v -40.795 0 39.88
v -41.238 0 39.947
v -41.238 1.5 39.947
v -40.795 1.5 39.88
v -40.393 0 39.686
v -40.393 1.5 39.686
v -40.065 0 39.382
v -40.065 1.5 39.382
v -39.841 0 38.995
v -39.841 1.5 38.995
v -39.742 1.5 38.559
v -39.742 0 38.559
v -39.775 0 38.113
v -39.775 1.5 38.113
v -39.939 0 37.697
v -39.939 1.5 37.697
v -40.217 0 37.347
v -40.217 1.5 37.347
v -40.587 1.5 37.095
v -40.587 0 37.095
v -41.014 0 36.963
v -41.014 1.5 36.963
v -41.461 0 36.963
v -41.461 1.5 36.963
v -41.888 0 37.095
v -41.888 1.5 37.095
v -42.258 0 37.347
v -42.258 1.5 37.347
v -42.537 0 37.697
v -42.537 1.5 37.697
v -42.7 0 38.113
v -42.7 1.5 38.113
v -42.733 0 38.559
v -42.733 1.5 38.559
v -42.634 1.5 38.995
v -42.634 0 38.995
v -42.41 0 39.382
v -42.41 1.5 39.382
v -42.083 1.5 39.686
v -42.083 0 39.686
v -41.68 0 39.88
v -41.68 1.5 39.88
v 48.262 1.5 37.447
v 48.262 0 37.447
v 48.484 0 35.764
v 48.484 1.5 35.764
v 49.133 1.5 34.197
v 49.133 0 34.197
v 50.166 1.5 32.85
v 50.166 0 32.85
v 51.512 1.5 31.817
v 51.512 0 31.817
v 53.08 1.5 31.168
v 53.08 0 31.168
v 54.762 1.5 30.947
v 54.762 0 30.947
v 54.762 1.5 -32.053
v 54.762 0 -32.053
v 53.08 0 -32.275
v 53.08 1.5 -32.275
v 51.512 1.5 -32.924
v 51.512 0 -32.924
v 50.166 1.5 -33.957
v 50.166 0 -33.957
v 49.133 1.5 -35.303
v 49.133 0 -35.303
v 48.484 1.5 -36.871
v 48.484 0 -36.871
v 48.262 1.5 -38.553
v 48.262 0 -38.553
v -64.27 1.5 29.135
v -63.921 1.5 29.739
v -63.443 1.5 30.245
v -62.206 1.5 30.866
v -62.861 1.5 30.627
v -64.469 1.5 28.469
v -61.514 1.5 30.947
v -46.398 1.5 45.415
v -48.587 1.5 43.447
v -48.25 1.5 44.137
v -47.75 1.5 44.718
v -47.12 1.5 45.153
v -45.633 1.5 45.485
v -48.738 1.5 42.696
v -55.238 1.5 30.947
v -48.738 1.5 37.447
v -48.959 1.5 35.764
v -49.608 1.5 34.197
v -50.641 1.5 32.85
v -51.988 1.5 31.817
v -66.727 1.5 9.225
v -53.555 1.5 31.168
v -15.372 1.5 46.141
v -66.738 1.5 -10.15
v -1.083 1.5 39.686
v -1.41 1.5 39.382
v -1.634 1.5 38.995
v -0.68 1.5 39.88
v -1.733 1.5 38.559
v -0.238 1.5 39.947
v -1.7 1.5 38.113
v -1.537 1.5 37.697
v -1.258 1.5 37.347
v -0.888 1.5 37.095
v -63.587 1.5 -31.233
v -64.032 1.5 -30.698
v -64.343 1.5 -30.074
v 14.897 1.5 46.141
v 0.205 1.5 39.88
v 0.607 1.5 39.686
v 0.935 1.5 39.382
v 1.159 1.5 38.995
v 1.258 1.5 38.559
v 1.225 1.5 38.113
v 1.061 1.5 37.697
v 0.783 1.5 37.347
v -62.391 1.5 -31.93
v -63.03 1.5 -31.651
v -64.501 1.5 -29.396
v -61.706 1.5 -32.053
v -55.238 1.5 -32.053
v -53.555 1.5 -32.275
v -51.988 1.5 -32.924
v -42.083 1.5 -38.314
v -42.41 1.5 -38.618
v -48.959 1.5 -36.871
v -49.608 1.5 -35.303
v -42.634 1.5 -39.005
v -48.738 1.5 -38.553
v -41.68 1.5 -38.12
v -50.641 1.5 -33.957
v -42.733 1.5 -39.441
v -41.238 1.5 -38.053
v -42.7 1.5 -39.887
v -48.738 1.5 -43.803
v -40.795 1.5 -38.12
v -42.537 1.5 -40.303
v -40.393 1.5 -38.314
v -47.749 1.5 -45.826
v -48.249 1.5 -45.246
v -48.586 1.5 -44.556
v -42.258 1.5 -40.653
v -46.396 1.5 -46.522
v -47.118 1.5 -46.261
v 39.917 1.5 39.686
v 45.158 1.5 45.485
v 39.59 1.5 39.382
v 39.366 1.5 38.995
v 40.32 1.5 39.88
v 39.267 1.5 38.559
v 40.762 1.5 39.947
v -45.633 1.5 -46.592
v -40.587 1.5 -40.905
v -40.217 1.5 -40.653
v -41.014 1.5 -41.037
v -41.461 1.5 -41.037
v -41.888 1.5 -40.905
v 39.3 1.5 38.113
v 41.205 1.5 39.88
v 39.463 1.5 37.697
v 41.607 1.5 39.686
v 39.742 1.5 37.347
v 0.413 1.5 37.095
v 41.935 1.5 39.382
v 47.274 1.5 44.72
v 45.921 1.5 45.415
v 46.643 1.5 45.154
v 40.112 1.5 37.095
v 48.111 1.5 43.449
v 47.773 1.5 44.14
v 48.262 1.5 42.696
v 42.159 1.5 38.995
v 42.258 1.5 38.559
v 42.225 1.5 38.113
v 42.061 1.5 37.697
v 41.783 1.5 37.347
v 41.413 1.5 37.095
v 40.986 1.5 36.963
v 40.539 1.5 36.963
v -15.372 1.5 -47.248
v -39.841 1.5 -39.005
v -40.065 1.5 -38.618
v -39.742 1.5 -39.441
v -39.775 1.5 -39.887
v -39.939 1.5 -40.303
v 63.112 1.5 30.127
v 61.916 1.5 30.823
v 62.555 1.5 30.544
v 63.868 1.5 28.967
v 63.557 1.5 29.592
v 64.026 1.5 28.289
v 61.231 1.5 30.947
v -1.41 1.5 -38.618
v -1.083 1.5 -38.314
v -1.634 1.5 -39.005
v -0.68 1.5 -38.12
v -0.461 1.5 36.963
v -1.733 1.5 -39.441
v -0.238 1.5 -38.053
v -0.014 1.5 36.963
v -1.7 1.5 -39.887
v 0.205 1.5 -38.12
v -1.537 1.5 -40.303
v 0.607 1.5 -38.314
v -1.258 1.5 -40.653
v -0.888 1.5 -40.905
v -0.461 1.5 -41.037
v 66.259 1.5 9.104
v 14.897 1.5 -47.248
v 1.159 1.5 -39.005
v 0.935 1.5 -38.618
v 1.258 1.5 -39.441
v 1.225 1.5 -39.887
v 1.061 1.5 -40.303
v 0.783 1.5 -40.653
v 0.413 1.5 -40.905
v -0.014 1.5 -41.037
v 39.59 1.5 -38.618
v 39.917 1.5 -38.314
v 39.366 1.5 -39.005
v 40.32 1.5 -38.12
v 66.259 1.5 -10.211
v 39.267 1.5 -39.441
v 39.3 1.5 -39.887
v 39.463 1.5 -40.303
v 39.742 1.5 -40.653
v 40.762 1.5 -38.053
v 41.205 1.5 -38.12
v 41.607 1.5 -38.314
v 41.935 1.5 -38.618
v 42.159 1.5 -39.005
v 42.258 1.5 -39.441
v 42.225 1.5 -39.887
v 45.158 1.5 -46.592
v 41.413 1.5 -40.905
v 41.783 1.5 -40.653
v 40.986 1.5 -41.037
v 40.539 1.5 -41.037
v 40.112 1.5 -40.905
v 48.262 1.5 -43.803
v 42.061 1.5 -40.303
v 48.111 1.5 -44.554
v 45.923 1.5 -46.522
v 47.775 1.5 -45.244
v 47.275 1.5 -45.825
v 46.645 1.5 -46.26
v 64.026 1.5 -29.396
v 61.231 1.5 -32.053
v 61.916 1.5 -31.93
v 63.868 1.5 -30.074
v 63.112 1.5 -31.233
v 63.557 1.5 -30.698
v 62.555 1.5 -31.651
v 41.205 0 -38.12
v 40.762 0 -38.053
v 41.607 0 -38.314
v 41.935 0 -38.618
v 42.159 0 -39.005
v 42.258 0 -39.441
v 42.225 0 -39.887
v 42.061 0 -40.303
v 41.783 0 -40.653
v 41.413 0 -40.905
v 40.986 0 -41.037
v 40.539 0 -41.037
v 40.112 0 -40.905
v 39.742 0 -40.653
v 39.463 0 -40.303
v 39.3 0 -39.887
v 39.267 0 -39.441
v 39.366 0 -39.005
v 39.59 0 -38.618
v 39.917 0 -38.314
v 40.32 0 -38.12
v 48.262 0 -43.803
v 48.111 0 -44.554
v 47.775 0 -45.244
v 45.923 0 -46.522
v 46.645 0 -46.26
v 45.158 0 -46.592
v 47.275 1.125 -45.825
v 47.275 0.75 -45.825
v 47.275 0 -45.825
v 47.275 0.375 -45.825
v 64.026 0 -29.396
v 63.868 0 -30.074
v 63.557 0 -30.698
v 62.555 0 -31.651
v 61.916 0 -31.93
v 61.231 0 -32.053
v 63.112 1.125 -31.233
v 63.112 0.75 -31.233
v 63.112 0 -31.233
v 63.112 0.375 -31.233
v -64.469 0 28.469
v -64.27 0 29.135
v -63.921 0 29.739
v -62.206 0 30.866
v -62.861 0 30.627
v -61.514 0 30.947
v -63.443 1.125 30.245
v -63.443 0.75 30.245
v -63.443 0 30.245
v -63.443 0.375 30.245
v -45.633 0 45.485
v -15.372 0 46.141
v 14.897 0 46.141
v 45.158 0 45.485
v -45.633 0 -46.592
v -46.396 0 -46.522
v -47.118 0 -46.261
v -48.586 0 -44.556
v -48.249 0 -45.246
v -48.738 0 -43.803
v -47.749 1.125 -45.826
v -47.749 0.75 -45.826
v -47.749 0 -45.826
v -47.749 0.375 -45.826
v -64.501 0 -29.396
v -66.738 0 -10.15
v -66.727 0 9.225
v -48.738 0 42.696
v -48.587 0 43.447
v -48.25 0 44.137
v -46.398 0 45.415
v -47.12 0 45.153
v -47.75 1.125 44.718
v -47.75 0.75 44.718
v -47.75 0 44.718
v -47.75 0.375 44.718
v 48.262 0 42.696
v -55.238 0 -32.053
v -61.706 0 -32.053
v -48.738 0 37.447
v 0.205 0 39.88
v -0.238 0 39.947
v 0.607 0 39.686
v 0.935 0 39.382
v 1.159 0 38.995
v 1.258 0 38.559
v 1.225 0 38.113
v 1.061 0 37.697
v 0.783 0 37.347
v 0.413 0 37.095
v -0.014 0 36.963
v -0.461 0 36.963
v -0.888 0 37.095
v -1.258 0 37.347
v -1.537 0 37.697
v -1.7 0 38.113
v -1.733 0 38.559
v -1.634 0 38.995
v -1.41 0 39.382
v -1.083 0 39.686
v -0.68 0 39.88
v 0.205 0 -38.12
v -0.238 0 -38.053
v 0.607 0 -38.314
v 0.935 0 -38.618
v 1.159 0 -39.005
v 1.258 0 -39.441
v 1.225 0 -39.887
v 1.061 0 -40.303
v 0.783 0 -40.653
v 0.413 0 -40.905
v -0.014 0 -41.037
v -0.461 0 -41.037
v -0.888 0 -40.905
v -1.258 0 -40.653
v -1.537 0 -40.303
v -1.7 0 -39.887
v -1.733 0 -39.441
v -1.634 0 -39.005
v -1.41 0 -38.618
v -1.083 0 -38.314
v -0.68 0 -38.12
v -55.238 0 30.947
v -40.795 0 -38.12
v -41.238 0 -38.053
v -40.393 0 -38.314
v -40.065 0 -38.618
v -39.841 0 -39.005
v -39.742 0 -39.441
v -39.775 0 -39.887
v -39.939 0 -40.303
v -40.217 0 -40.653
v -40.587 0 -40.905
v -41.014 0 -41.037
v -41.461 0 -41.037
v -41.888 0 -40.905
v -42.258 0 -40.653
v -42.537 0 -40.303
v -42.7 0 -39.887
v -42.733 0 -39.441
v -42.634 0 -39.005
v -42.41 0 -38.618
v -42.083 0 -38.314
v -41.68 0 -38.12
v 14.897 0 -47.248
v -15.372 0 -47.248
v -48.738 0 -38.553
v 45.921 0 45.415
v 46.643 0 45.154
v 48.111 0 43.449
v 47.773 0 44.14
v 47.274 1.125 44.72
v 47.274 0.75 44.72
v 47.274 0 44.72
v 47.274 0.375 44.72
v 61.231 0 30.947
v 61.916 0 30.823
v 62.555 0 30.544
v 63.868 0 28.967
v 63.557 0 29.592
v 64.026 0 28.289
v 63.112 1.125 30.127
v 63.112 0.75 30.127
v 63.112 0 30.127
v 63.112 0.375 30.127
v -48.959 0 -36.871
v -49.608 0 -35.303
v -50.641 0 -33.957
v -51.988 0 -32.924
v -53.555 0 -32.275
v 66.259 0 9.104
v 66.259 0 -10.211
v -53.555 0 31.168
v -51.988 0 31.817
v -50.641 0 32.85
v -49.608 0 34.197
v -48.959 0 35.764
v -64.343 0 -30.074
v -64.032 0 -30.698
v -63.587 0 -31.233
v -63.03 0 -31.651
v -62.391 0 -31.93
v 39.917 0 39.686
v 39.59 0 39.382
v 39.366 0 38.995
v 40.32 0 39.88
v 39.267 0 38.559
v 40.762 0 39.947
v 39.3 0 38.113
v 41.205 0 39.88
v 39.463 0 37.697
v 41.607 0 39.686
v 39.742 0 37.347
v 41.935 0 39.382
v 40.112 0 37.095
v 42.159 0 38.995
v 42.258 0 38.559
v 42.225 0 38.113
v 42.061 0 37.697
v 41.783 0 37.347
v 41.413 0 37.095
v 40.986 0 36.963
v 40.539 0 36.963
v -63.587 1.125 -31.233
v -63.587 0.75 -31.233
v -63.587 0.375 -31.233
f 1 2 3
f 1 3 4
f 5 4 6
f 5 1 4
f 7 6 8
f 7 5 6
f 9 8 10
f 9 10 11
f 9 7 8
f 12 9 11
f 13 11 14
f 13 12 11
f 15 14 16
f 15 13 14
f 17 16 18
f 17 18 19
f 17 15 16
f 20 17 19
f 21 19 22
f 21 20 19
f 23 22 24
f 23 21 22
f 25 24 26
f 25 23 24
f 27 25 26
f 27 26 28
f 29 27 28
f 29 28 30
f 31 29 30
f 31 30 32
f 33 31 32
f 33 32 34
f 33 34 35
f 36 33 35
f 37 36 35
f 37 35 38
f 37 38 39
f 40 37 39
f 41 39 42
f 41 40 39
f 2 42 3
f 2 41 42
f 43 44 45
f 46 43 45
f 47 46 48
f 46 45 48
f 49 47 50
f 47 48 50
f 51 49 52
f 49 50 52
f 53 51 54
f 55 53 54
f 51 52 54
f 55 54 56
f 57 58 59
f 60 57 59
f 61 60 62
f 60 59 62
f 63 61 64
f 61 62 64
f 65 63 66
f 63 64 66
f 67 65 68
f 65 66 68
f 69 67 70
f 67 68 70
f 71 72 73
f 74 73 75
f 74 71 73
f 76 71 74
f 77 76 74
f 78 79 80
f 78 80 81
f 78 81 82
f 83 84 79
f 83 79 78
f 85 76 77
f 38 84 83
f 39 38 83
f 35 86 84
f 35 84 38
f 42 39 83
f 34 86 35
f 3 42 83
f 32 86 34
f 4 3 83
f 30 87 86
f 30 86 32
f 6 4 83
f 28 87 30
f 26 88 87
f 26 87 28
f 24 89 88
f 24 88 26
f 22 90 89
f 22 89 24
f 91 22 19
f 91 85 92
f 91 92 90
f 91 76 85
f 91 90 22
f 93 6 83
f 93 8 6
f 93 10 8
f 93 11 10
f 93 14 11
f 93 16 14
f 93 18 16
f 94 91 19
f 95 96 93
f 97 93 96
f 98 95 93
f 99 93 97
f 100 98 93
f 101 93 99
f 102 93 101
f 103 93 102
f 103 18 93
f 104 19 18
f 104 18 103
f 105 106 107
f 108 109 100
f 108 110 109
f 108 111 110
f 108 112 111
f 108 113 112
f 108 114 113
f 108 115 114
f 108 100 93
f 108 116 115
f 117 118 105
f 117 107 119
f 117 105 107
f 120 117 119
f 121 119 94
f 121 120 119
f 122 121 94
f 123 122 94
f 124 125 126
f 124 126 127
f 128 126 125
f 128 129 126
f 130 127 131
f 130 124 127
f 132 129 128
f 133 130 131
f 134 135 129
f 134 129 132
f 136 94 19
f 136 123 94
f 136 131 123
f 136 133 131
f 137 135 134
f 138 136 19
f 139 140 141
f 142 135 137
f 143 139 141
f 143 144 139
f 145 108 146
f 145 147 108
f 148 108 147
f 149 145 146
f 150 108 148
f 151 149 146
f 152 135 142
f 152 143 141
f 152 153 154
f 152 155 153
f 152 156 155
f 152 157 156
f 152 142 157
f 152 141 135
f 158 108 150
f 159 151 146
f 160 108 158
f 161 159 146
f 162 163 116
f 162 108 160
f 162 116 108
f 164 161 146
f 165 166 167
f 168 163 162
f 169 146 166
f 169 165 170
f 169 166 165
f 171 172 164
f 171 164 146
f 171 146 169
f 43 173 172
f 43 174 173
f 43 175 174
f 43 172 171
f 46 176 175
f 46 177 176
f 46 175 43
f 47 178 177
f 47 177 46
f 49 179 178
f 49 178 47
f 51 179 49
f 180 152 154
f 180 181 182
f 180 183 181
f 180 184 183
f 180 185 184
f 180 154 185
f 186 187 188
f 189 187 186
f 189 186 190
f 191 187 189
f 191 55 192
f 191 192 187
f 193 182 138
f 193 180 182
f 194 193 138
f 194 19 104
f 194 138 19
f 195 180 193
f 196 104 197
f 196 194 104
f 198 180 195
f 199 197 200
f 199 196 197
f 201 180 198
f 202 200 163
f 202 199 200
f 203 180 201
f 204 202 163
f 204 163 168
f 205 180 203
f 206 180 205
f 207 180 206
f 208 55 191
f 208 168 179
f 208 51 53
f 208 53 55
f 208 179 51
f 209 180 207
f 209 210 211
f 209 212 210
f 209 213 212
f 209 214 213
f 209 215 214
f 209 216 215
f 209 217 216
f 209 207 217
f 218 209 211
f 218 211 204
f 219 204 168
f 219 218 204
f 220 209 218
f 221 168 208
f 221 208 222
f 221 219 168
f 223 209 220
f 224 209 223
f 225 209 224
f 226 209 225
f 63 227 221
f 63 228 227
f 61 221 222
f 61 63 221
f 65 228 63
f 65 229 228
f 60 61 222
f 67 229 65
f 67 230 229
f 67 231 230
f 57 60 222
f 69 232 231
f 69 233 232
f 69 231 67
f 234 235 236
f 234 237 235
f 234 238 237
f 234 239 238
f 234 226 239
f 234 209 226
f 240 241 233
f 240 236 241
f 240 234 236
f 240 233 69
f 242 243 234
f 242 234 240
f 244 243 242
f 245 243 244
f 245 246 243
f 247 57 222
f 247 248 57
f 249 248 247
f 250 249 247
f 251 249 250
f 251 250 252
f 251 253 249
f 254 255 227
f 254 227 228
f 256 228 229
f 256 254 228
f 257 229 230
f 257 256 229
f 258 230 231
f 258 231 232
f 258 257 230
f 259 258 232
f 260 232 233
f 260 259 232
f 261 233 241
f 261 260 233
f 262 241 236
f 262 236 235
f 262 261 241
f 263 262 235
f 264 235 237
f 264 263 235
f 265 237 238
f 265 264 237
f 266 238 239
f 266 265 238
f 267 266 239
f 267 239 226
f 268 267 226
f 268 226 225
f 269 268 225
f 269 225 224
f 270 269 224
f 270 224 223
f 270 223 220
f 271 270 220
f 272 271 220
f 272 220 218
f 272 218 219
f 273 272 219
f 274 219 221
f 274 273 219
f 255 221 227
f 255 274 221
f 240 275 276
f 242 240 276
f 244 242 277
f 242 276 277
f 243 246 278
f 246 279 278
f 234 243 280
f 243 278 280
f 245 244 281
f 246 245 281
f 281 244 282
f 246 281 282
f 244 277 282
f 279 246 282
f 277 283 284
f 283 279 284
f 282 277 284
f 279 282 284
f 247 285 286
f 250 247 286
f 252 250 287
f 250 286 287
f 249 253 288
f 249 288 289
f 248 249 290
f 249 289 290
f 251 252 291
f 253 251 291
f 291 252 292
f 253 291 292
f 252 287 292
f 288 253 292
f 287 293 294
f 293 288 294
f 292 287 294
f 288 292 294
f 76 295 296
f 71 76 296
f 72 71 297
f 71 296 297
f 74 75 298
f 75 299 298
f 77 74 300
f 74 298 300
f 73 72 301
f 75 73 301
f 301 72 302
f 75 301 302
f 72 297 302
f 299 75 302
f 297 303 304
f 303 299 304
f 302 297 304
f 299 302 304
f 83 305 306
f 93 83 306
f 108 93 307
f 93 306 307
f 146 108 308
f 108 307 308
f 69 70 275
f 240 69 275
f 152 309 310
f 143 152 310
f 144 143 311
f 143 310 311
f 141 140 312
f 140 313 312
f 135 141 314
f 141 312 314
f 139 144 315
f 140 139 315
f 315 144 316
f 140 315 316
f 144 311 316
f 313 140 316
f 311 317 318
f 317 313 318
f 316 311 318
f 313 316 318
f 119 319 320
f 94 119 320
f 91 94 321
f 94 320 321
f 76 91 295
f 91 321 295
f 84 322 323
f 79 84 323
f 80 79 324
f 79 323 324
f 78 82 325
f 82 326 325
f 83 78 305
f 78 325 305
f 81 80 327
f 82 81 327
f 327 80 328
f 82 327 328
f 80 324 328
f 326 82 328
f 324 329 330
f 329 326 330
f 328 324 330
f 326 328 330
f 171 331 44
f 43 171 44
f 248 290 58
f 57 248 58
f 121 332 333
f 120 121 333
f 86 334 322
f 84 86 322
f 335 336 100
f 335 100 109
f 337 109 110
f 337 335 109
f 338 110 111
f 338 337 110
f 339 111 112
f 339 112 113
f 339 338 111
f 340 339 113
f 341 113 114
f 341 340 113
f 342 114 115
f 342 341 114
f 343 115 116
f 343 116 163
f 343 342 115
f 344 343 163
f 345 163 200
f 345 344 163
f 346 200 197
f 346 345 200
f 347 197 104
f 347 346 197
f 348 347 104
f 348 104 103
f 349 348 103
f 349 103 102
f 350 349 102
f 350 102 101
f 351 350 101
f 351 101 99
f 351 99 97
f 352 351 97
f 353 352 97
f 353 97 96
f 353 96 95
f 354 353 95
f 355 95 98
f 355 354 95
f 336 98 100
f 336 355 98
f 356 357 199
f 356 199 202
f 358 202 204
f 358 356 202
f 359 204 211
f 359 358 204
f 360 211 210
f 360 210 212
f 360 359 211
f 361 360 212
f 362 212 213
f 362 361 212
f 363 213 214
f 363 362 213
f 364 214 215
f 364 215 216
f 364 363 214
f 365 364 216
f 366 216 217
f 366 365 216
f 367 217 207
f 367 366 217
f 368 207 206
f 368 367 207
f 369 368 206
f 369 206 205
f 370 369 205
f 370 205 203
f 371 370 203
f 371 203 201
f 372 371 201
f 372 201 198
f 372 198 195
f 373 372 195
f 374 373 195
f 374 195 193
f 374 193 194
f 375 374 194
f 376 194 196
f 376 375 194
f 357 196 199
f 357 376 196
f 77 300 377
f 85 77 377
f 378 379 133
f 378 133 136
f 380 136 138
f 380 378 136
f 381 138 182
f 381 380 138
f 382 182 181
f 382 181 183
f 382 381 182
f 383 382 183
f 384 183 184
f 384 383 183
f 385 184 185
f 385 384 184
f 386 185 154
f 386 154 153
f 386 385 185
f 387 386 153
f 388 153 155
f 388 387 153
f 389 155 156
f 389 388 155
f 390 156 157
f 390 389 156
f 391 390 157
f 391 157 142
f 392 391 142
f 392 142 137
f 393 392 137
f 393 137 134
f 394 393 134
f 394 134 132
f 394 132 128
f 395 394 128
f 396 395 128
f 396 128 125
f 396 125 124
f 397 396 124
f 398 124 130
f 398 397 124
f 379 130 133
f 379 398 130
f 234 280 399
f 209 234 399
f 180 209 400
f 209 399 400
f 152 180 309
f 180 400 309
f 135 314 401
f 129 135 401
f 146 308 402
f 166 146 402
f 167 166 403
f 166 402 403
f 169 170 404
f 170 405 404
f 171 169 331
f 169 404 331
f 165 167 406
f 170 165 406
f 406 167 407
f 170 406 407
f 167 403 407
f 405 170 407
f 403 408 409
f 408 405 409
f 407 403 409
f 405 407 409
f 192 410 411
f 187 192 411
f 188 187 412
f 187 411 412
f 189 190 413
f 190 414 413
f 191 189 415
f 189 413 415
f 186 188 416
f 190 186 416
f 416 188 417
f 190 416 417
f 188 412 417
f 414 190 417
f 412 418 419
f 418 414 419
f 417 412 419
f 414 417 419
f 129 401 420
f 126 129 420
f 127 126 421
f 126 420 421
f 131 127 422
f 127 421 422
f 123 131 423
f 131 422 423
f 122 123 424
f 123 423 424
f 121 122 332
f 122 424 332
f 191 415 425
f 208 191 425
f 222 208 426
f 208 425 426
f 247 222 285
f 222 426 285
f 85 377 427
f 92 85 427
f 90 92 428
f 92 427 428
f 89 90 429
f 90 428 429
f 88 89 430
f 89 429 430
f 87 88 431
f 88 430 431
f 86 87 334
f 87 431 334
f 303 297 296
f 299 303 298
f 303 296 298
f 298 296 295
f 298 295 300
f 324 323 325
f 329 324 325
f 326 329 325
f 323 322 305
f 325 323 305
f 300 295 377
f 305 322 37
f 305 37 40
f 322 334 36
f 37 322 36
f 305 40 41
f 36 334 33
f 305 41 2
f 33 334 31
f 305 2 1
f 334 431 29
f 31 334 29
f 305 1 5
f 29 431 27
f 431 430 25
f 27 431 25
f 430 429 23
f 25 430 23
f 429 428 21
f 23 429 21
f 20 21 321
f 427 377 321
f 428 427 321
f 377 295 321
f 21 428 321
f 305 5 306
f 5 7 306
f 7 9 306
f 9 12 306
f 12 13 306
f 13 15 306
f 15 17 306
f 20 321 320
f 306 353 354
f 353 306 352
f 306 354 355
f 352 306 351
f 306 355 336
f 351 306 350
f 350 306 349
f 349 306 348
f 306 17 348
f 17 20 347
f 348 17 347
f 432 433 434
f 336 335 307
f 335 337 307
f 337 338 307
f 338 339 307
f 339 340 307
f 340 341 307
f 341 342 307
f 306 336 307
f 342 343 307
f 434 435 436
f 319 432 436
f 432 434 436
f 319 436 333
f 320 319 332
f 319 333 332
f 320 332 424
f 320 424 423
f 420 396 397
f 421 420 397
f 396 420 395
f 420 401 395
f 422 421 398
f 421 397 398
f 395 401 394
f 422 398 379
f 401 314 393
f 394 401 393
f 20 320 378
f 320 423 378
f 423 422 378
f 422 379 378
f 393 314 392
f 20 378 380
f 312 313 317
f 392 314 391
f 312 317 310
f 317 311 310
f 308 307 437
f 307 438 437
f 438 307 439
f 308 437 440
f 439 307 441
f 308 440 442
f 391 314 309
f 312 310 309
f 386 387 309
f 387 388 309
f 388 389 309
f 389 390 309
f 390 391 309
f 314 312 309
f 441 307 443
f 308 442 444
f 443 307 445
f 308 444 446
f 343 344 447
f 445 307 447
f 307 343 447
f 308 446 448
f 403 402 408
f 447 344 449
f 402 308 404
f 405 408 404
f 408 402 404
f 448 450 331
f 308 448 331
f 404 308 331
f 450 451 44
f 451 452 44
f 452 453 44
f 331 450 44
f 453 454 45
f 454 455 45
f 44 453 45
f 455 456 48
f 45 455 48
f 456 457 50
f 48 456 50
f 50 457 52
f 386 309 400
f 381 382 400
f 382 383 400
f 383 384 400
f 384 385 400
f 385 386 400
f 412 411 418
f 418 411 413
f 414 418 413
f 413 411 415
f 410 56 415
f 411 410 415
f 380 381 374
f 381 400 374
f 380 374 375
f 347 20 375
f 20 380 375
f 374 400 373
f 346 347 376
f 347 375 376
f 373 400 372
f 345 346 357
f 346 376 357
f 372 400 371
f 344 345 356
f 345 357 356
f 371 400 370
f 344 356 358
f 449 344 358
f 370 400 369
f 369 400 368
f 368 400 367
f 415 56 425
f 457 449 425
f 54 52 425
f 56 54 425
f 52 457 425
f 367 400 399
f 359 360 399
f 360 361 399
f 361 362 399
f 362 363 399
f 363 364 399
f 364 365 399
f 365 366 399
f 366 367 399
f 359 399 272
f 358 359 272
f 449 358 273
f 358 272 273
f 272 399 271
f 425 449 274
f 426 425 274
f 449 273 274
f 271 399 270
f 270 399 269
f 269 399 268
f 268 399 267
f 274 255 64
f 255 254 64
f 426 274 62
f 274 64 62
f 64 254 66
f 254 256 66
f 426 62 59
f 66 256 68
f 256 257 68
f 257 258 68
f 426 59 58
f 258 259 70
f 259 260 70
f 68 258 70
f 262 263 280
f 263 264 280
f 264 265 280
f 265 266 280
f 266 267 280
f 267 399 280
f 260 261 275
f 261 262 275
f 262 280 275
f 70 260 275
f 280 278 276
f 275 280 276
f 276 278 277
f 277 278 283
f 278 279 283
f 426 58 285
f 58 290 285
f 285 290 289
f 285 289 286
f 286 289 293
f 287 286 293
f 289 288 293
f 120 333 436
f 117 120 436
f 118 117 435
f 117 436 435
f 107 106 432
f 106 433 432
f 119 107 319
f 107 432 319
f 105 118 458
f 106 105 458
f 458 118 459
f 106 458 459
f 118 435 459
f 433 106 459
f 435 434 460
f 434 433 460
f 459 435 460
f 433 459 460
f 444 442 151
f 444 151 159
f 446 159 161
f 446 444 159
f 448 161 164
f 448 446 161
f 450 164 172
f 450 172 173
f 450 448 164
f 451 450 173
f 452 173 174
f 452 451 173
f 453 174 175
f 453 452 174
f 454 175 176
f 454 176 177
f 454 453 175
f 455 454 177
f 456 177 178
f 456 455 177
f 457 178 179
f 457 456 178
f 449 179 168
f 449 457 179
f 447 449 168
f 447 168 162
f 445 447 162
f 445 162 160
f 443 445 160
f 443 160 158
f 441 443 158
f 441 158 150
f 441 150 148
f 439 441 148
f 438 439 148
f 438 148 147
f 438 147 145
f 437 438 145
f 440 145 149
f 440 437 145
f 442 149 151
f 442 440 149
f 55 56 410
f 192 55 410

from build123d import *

# Parameters (mm, degrees)
SKETCH_1_R      = 1.5
EXTRUDE_1_DEPTH = 1.5


with BuildPart() as part:
    # Эскиз1 → Бобышка-Вытянуть1 (new body)
    with BuildSketch(Plane(origin=(0, 0, 0), x_dir=(1, 0, 0), z_dir=(0, 1, 0))):
        with BuildLine():
            Line((-55.237590769, 32.053388295), (-61.7059188, 32.053388295))
            add(Edge.make_bspline(
                [(-61.7059188, 32.053388295), (-62.052521275, 32.031778061), (-62.744091711, 31.865477519), (-63.629073773, 31.277665282), (-64.260833863, 30.4238638), (-64.461976453, 29.741355241), (-64.501017169, 29.396222514)],
                knots=[0, 0, 0, 0, 0.25, 0.5, 0.75, 1, 1, 1, 1], degree=3))
            ThreePointArc((-64.501017169, 29.396222514), (-67.014010182, 0.462468283), (-64.469471559, -28.468528779))
            add(Edge.make_bspline(
                [(-64.469471559, -28.468528779), (-64.409048461, -28.810456535), (-64.166033983, -29.478831911), (-63.482303299, -30.291913357), (-62.562853807, -30.823470466), (-61.861851099, -30.946611705), (-61.514440275, -30.946611705)],
                knots=[0, 0, 0, 0, 0.25, 0.5, 0.75, 1, 1, 1, 1], degree=3))
            Line((-61.514440275, -30.946611705), (-55.237590769, -30.946611705))
            ThreePointArc((-55.237590769, -30.946611705), (-50.641396691, -32.850417627), (-48.737590769, -37.446611705))
            Line((-48.737590769, -37.446611705), (-48.737590769, -42.6958694))
            add(Edge.make_bspline(
                [(-48.737590769, -42.6958694), (-48.71091302, -43.077168109), (-48.507739461, -43.837500854), (-47.799680152, -44.773477074), (-46.795875092, -45.377409673), (-46.015918692, -45.499416665), (-45.633251479, -45.485174585)],
                knots=[0, 0, 0, 0, 0.25, 0.5, 0.75, 1, 1, 1, 1], degree=3))
            ThreePointArc((-45.633251479, -45.485174585), (-0.237590768, -46.223055901), (45.158069943, -45.485174585))
            add(Edge.make_bspline(
                [(45.158069943, -45.485174585), (45.539941303, -45.499387045), (46.317416103, -45.378581331), (47.323432889, -44.774398344), (48.030926989, -43.840884512), (48.235672001, -43.078018207), (48.26240923, -42.69586945)],
                knots=[0, 0, 0, 0, 0.25, 0.5, 0.75, 1, 1, 1, 1], degree=3))
            Line((48.26240923, -42.69586945), (48.26240923, -37.446611743))
            ThreePointArc((48.26240923, -37.446611743), (50.166215153, -32.850417666), (54.76240923, -30.946611743))
            Line((54.76240923, -30.946611743), (61.230737262, -30.946611743))
            add(Edge.make_bspline(
                [(61.230737262, -30.946611743), (61.577339736, -30.925001509), (62.268910172, -30.758700967), (63.153892234, -30.17088873), (63.785652325, -29.317087248), (63.986794915, -28.634578689), (64.025835631, -28.289445963)],
                knots=[0, 0, 0, 0, 0.25, 0.5, 0.75, 1, 1, 1, 1], degree=3))
            ThreePointArc((64.025835631, -28.289445963), (66.538853426, 0.553388257), (64.025835631, 29.396222476))
            add(Edge.make_bspline(
                [(64.025835631, 29.396222476), (63.98680709, 29.741247568), (63.785855195, 30.423449895), (63.154045977, 31.277502704), (62.269456107, 31.865245071), (61.577474792, 32.031769602), (61.230737261, 32.053388257)],
                knots=[0, 0, 0, 0, 0.25, 0.5, 0.75, 1, 1, 1, 1], degree=3))
            Line((61.230737261, 32.053388257), (54.762409231, 32.053388257))
            ThreePointArc((54.762409231, 32.053388257), (50.166215153, 33.957194179), (48.262409231, 38.553388257))
            Line((48.262409231, 38.553388257), (48.262409231, 43.802645952))
            add(Edge.make_bspline(
                [(48.262409231, 43.802645952), (48.235731482, 44.18394466), (48.032557923, 44.944277406), (47.324498614, 45.880253626), (46.320693554, 46.484186224), (45.540737153, 46.606193217), (45.158069941, 46.591951137)],
                knots=[0, 0, 0, 0, 0.25, 0.5, 0.75, 1, 1, 1, 1], degree=3))
            ThreePointArc((45.158069941, 46.591951137), (-0.237590771, 47.329832452), (-45.633251482, 46.591951137))
            add(Edge.make_bspline(
                [(-45.633251482, 46.591951137), (-46.015122842, 46.606163597), (-46.792597641, 46.485357883), (-47.798614427, 45.881174896), (-48.506108527, 44.947661064), (-48.71085354, 44.184794759), (-48.737590769, 43.802646001)],
                knots=[0, 0, 0, 0, 0.25, 0.5, 0.75, 1, 1, 1, 1], degree=3))
            Line((-48.737590769, 43.802646001), (-48.737590769, 38.553388295))
            ThreePointArc((-48.737590769, 38.553388295), (-50.641396691, 33.957194217), (-55.237590769, 32.053388295))
        make_face()
        with Locations(Location((-41.237590769, 39.553388295, 0), (0, 0, 270))):
            Circle(SKETCH_1_R, mode=Mode.SUBTRACT)
        with Locations(Location((-0.237590769, 39.553388295, 0), (0, 0, 270))):
            Circle(SKETCH_1_R, mode=Mode.SUBTRACT)
        with Locations(Location((40.762409231, 39.553388295, 0), (0, 0, 270))):
            Circle(SKETCH_1_R, mode=Mode.SUBTRACT)
        with Locations(Location((-41.237590769, -38.446611705, 0), (0, 0, 270))):
            Circle(SKETCH_1_R, mode=Mode.SUBTRACT)
        with Locations(Location((-0.237590769, -38.446611705, 0), (0, 0, 270))):
            Circle(SKETCH_1_R, mode=Mode.SUBTRACT)
        with Locations(Location((40.762409231, -38.446611705, 0), (0, 0, 270))):
            Circle(SKETCH_1_R, mode=Mode.SUBTRACT)
    extrude(amount=EXTRUDE_1_DEPTH)


solid = part.part
